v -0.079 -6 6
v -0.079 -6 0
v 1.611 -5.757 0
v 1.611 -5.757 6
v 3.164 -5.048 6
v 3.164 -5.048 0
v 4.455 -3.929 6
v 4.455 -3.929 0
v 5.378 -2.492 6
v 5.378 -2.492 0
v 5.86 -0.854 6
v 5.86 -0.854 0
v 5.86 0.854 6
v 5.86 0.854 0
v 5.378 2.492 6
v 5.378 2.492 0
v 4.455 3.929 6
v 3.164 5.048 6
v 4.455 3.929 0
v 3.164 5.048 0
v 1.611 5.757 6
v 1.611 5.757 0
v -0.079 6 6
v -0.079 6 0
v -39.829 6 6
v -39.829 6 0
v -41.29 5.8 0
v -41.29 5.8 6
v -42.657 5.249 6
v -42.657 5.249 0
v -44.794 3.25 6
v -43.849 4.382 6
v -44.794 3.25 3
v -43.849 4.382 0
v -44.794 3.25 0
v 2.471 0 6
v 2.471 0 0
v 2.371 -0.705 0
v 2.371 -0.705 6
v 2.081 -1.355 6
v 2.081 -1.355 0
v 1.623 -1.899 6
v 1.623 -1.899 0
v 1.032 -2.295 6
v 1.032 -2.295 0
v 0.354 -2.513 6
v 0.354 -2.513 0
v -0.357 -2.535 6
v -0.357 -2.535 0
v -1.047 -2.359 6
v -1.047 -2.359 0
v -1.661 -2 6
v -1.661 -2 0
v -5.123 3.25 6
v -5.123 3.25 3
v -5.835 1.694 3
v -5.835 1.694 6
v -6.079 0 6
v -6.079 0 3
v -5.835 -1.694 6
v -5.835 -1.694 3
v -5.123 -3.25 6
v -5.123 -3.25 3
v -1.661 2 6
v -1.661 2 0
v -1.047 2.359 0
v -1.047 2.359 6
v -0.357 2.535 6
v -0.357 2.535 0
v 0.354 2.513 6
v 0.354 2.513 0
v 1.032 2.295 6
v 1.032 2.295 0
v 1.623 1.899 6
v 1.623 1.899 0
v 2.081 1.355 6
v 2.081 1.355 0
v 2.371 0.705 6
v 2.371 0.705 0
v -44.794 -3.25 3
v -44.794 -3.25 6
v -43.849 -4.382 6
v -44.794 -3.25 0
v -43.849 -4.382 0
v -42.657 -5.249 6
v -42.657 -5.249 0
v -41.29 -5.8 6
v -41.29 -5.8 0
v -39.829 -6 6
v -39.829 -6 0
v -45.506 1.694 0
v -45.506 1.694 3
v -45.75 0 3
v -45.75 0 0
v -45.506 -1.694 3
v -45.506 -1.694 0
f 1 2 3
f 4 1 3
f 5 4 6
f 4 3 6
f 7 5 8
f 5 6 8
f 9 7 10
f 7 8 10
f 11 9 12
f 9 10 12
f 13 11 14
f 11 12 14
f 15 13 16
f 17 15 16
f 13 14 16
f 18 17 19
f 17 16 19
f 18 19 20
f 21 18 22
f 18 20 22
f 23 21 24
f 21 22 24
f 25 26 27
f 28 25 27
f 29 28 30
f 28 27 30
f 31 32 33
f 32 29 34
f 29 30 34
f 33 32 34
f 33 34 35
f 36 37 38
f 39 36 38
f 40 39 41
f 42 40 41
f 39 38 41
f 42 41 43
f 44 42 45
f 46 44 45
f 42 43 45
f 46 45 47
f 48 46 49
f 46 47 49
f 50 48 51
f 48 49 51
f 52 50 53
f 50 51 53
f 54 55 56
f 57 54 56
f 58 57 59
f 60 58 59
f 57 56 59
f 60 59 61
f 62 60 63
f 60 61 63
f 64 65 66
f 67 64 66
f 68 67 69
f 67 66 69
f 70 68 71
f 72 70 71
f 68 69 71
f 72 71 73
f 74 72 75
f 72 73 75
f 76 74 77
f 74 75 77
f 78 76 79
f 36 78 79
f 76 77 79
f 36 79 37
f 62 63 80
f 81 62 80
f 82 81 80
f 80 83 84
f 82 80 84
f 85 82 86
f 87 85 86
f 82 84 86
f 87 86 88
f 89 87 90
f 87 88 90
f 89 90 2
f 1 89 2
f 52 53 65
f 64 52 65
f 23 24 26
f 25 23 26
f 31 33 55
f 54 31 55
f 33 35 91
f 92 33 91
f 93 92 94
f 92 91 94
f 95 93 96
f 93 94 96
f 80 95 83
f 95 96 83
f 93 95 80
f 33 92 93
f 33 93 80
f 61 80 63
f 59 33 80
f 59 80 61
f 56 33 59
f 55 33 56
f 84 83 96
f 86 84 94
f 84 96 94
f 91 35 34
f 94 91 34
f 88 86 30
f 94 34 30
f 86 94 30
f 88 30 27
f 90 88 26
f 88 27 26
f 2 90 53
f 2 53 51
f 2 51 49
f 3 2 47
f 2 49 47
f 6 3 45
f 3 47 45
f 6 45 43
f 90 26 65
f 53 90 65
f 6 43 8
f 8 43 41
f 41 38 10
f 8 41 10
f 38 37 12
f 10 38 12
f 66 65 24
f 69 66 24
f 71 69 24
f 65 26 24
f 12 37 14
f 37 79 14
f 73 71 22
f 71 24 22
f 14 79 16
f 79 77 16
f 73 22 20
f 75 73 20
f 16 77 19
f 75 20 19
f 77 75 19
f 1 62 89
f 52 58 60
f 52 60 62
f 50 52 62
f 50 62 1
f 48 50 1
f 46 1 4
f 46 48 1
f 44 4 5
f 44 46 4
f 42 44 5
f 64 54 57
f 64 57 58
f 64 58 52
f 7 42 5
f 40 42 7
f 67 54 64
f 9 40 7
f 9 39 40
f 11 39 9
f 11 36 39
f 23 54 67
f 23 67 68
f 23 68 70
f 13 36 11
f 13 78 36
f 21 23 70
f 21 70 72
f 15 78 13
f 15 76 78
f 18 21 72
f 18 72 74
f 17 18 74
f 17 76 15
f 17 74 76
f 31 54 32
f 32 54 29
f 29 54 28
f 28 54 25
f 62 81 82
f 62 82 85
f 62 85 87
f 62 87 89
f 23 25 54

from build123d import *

# Parameters (mm, degrees)
F1_DEPTH = 6
F2_DEPTH = 3


with BuildPart() as f1:
    # F0 (on Top) → F1 (new body)
    with BuildSketch(Plane.XY):
        with BuildLine():
            Line((-44.7939935698, 3.25), (-5.1229558211, 3.25))
            ThreePointArc((-5.1229558211, 3.25), (-6.0793955706, 0), (-5.1229558211, -3.25))
            Line((-5.1229558211, -3.25), (-44.7939935698, -3.25))
            ThreePointArc((-44.7939935698, -3.25), (-42.6572806733, -5.2490864776), (-39.8292040073, -6))
            Line((-39.8292040073, -6), (-0.0793955706, -6))
            ThreePointArc((-0.0793955706, -6), (5.9206044294, 0), (-0.0793955706, 6))
            Line((-0.0793955706, 6), (-39.8292040073, 6))
            ThreePointArc((-39.8292040073, 6), (-42.6572806733, 5.2490864776), (-44.7939935698, 3.25))
        make_face()
        with BuildLine():
            ThreePointArc((-1.6613247726, 2), (1.0315905983, 2.2952580971), (2.4706044294, 0))
            ThreePointArc((2.4706044294, 0), (1.0315905983, -2.2952580971), (-1.6613247726, -2))
            ThreePointArc((-1.6613247726, -2), (-2.6293955706, 0), (-1.6613247726, 2))
        make_face(mode=Mode.SUBTRACT)
        with BuildLine():
            Line((-1.6613247726, -2), (-1.6613247726, 2))
            ThreePointArc((-1.6613247726, 2), (-2.6293955706, 0), (-1.6613247726, -2))
        make_face()
    extrude(amount=F1_DEPTH)

    # F0 (on Top) → F2 (join)
    with BuildSketch(Plane.XY):
        with BuildLine():
            ThreePointArc((-5.1229558211, -3.25), (-6.0793955706, 0), (-5.1229558211, 3.25))
            Line((-5.1229558211, 3.25), (-44.7939935698, 3.25))
            ThreePointArc((-44.7939935698, 3.25), (-45.7503337184, 0), (-44.7939935698, -3.25))
            Line((-44.7939935698, -3.25), (-5.1229558211, -3.25))
        make_face()
    extrude(amount=F2_DEPTH)


solid = f1.part
